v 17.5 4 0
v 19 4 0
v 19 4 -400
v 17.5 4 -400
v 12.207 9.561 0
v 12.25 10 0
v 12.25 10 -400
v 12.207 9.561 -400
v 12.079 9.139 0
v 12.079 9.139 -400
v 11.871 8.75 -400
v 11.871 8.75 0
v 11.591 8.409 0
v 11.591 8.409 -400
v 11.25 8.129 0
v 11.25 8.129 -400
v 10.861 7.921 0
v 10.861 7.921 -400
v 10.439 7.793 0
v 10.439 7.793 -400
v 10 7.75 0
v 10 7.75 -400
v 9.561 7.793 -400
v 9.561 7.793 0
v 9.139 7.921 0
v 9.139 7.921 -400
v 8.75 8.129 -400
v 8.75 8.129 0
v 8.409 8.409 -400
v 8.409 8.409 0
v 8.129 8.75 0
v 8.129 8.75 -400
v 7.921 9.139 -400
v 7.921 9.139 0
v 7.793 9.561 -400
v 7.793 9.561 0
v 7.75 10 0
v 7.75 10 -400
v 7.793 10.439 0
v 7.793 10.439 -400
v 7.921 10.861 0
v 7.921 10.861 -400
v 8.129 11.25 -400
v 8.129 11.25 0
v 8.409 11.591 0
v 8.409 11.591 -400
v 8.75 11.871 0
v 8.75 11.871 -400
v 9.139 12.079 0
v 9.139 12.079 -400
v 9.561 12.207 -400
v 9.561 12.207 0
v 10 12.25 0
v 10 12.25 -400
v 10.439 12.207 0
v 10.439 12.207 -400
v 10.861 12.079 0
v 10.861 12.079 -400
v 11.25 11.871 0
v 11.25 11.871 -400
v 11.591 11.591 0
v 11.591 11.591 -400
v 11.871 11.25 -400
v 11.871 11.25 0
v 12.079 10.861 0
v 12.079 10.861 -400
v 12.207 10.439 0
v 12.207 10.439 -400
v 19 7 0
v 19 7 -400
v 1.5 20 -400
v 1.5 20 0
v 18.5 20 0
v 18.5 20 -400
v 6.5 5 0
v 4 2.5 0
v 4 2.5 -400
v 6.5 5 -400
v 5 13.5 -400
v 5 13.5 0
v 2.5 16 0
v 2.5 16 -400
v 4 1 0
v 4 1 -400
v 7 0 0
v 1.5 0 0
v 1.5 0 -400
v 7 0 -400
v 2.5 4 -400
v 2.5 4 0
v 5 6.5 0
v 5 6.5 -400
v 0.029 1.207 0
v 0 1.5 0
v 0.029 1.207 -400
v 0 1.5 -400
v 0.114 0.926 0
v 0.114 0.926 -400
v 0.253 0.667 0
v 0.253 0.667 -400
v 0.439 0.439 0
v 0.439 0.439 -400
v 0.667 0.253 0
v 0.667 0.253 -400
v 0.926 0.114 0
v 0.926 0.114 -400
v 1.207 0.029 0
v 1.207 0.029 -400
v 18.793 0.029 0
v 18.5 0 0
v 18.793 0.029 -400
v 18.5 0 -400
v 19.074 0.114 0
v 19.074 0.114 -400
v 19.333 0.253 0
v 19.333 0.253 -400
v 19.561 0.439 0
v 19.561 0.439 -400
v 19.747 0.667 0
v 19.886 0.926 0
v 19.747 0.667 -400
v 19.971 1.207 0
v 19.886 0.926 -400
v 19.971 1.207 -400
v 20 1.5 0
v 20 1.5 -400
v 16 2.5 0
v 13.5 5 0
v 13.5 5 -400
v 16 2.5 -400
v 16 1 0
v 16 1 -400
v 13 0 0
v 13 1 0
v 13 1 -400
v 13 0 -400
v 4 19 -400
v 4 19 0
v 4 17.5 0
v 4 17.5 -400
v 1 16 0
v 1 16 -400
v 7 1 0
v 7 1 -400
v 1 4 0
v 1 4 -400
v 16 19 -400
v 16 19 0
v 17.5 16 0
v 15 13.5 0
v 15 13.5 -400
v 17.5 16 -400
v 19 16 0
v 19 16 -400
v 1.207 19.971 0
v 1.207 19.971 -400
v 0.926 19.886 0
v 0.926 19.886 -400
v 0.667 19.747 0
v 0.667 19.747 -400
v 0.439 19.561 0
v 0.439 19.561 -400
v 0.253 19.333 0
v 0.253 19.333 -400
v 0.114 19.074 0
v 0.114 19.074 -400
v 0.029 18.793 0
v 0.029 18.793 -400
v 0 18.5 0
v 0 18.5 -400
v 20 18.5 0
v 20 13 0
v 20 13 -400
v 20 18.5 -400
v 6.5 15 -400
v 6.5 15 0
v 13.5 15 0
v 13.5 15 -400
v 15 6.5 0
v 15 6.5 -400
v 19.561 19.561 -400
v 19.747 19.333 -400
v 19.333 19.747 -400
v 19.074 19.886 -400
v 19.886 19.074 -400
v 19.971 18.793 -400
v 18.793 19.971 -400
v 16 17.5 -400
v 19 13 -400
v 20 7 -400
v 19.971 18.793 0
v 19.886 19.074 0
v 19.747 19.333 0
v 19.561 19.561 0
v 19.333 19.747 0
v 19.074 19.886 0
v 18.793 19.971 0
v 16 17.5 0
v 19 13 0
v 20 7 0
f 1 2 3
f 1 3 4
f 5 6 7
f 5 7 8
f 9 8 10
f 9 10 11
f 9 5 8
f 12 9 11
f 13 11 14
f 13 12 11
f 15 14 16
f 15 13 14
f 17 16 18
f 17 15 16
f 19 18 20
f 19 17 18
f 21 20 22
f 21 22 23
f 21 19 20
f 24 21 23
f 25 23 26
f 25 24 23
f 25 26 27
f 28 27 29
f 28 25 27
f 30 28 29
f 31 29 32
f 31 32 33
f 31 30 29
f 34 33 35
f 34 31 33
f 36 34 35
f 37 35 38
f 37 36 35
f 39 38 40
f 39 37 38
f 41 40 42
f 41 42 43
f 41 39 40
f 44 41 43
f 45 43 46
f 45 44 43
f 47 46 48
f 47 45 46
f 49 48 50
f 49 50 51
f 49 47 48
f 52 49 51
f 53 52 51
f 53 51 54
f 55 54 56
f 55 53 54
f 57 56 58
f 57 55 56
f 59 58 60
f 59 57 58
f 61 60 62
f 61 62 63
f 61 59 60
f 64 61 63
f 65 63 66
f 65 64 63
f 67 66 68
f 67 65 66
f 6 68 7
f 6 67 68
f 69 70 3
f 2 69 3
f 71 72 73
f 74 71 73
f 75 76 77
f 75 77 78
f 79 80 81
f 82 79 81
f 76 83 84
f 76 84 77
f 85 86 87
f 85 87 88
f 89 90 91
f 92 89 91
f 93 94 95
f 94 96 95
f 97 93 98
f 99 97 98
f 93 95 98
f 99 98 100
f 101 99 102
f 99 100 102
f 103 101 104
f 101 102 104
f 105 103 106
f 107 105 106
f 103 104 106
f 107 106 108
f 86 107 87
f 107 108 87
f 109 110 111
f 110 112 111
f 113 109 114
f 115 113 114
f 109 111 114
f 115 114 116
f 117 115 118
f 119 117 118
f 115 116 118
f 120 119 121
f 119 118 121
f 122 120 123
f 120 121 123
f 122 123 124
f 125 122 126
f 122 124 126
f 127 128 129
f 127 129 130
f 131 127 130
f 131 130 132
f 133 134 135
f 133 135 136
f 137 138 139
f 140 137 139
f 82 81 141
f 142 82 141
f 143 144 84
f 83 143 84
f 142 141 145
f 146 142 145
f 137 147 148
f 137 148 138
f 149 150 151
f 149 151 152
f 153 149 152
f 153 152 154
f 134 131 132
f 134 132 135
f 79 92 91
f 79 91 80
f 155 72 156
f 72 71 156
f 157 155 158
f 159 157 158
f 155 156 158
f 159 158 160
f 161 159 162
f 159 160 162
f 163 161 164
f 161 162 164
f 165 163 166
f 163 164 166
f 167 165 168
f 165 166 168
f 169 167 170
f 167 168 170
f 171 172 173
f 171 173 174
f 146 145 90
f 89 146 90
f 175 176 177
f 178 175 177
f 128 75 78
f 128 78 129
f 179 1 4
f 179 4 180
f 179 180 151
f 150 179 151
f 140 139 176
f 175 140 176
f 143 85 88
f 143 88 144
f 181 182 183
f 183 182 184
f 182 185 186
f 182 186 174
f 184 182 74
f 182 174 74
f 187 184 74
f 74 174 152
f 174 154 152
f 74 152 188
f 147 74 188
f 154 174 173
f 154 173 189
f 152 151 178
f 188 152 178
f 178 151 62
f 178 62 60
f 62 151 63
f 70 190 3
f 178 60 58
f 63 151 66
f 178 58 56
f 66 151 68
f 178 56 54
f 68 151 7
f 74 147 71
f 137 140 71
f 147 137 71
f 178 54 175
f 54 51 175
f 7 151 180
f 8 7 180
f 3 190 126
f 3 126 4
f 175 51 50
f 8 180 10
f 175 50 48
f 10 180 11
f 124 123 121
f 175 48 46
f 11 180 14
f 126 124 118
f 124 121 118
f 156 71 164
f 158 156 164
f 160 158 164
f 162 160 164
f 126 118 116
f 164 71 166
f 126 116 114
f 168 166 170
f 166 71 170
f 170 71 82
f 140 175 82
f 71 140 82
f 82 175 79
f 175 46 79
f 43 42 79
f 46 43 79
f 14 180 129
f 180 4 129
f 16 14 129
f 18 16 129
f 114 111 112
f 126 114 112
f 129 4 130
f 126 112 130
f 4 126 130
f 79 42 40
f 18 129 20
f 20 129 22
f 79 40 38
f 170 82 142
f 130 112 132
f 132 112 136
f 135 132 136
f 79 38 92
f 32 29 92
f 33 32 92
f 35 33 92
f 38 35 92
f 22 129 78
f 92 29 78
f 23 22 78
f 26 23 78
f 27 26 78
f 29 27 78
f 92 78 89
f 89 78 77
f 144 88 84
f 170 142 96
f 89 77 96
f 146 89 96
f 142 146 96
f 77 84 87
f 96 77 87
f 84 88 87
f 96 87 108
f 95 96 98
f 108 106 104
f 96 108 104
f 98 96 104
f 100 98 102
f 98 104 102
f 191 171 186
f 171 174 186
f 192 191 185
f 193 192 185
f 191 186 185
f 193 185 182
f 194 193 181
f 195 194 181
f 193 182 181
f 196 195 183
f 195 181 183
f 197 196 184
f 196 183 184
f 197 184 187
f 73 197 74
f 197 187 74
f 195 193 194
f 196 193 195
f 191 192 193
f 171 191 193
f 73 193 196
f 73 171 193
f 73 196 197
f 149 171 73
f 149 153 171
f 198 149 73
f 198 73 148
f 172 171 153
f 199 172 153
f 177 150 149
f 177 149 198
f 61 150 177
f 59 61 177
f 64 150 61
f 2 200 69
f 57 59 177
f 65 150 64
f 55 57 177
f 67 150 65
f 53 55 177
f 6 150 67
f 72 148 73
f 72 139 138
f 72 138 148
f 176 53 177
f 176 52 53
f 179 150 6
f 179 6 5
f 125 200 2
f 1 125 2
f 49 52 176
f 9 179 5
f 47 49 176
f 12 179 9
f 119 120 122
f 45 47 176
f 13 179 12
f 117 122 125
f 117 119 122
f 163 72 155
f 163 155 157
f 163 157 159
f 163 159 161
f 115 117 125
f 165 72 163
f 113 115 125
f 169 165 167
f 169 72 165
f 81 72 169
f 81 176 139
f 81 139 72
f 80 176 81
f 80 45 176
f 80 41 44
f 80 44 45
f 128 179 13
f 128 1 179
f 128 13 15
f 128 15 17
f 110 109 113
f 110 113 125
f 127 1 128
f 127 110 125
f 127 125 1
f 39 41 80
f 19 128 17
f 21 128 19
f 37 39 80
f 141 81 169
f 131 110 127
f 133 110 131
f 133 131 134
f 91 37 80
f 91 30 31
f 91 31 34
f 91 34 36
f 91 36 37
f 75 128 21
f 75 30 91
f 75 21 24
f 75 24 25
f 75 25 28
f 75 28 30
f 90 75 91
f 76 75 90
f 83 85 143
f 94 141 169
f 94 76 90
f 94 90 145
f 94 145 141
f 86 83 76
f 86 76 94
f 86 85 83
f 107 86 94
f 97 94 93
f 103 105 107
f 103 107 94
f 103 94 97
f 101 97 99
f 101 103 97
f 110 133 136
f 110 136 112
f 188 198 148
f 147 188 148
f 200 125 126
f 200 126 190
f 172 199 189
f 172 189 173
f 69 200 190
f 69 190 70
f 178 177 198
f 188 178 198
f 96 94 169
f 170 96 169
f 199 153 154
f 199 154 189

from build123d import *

# Parameters (mm, degrees)
SKETCH_R  = 2.25
PAD_DEPTH = 400
FILLET_R  = 1.5


with BuildPart() as part:
    # Sketch → Pad (new body)
    with BuildSketch(Plane(origin=(0, 0, 0), x_dir=(1, 0, 0), z_dir=(0, 0, -1))):
        Polygon((7, 0), (7, -1), (4, -1), (4, -2.5), (6.499998, -5), (13.500002, -5), (16, -2.5), (16, -1), (13, -1), (13, 0), (20, 0), (20, -7), (19, -7), (19, -4), (17.5, -4), (15.000002, -6.5), (15.000002, -13.500005), (17.5, -16.000005), (19, -16.000005), (19, -13.000005), (20, -13.000005), (20, -20.000005), (13, -20.000005), (7, -20.000005), (0, -20.000005), (0, -13.000005), (0, -7), (0, 0), align=None)
        with Locations((10, -10.000002)):
            Circle(SKETCH_R, mode=Mode.SUBTRACT)
        Polygon((7, -19.000005), (4, -19.000005), (4, -17.500005), (6.499998, -15.000005), (13.500002, -15.000005), (16, -17.500005), (16, -19.000005), (13, -19.000005), align=None, mode=Mode.SUBTRACT)
        Polygon((1, -7), (1, -4), (2.5, -4), (4.999998, -6.5), (4.999998, -13.500005), (2.5, -16.000005), (1, -16.000005), (1, -13.000005), align=None, mode=Mode.SUBTRACT)
    extrude(amount=PAD_DEPTH)

    # Fillet
    fillet_edges = [part.edges().sort_by_distance(p)[0] for p in [
        (0, 20.000005, -200),
        (0, 0, -200),
        (20, 0, -200),
        (20, 20.000005, -200),
    ]]
    fillet(fillet_edges, radius=FILLET_R)


solid = part.part
